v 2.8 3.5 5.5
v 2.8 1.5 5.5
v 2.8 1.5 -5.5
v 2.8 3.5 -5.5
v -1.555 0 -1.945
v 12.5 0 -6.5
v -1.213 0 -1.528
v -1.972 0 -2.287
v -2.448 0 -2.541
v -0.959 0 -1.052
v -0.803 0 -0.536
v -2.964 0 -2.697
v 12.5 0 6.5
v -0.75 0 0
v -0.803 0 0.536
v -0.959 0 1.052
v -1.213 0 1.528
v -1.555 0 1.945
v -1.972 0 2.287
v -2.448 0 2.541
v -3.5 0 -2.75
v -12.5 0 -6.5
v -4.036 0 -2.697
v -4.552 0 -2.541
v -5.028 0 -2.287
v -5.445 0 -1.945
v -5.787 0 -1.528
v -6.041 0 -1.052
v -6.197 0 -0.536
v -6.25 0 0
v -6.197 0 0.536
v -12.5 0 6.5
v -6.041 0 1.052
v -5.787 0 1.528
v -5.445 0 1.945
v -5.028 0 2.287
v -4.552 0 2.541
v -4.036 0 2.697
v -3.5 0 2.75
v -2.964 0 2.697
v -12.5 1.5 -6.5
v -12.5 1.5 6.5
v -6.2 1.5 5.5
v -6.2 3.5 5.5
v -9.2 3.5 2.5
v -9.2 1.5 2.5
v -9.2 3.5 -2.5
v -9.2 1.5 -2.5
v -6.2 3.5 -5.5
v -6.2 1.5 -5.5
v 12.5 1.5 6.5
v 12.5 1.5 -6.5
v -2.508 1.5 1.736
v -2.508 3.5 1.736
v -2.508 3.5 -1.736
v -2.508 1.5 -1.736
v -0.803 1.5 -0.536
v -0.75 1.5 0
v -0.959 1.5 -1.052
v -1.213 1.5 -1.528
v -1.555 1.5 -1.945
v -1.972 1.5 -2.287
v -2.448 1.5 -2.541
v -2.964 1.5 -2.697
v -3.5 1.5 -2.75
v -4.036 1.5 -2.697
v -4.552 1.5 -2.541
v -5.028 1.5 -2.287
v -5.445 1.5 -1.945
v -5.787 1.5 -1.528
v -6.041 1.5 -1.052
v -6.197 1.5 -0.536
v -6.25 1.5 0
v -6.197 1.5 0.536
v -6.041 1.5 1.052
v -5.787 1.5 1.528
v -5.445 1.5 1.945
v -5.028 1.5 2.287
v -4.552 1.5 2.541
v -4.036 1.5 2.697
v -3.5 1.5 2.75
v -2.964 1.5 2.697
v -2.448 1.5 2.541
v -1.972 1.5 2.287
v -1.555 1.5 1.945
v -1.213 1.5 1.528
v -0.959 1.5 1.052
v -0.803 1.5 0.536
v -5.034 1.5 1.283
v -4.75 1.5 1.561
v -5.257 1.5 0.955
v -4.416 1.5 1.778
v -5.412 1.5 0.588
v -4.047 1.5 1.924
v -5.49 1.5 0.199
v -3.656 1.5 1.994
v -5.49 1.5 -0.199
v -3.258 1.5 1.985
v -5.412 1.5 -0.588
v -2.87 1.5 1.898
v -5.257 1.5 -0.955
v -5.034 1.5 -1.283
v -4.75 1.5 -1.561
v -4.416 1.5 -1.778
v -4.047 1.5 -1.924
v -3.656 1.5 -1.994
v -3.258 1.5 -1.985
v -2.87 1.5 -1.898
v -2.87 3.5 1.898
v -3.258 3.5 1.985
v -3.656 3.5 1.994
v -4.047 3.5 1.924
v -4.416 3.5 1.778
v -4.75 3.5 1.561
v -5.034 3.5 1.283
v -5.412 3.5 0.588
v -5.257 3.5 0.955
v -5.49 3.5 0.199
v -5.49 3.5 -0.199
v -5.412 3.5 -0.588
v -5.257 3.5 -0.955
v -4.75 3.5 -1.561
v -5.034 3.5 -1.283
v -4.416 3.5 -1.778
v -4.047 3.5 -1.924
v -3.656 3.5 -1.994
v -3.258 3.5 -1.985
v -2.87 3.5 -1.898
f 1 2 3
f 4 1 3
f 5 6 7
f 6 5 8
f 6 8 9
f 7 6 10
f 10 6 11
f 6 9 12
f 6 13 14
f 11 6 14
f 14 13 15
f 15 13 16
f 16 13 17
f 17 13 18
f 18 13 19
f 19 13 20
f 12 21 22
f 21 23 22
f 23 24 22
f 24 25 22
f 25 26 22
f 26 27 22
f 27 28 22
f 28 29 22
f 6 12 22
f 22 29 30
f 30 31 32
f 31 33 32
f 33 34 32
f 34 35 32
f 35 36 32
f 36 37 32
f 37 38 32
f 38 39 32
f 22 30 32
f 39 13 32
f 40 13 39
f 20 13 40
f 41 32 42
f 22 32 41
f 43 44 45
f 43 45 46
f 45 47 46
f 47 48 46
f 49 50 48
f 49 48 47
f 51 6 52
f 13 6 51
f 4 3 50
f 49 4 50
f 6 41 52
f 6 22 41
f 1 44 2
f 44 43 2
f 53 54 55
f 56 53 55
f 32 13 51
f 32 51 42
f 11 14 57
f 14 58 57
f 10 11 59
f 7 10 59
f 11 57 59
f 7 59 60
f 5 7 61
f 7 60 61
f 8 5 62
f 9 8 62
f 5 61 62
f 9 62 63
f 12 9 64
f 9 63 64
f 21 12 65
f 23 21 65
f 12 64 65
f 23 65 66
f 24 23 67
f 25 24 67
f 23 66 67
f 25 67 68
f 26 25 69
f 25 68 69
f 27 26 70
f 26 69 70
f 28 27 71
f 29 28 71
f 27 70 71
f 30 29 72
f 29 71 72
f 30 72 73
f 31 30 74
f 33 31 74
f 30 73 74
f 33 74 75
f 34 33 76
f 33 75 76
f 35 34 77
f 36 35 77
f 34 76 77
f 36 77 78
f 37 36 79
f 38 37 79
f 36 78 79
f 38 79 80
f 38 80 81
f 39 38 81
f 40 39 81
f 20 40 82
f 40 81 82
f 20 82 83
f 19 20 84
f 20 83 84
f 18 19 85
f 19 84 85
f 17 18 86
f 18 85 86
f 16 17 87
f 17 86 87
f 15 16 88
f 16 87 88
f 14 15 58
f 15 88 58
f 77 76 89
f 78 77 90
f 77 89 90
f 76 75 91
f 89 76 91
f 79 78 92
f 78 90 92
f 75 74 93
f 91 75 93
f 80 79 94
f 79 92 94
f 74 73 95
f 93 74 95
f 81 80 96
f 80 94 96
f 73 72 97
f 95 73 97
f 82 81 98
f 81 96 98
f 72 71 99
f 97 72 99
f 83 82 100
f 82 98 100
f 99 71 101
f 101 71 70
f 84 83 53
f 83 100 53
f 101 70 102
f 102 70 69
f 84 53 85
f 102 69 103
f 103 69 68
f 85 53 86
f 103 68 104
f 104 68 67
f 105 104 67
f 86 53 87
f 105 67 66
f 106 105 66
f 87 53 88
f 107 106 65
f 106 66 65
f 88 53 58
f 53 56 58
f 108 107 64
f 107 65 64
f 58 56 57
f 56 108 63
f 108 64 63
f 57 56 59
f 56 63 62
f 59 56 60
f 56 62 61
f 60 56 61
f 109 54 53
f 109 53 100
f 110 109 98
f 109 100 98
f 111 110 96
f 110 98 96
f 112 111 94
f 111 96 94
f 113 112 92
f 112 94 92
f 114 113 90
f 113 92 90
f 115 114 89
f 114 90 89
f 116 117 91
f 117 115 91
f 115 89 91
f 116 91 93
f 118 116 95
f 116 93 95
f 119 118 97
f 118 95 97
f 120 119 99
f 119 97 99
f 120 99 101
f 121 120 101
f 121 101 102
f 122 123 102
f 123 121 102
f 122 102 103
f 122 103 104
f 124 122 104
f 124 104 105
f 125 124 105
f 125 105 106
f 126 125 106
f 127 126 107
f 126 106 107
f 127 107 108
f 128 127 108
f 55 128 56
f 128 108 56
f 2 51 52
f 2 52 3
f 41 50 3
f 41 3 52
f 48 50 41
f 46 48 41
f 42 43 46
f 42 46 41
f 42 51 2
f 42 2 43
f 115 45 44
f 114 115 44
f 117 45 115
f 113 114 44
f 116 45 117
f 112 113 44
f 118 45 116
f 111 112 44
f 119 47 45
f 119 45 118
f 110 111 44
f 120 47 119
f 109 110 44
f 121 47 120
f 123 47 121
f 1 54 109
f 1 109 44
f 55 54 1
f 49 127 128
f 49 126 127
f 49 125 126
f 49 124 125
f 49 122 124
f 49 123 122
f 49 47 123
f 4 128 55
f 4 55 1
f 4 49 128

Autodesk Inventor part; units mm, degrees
ref_plane "YZ Plane" through (0, 0, 0) normal (1, 0, 0) x (0, 1, 0)
ref_plane "XZ Plane" through (0, 0, 0) normal (0, 1, 0) x (-1, 0, 0)
ref_plane "XY Plane" through (0, 0, 0) normal (0, 0, 1) x (1, 0, 0)
sketch "Boceto1" plane through (0, 0, 0) normal (0, 1, 0) x (-1, 0, 0)
  line L0 (-12.5, 6.5) -> (12.5, 6.5)
  line L1 (12.5, 6.5) -> (12.5, -6.5)
  line L2 (12.5, -6.5) -> (-12.5, -6.5)
  line L3 (-12.5, -6.5) -> (-12.5, 6.5)
  line L4 (-12.5, 6.5) -> (12.5, -6.5) construction
  line L5 (12.5, 6.5) -> (-12.5, -6.5) construction
  point P0 (0, 0)
  dimension "d0" = 13
  dimension "d1" = 25
extrude "Extrusión1" add sketch "Boceto1" along normal blind 1.5
sketch "Boceto2" plane through (0, 1.5, 0) normal (0, 1, 0) x (1, 0, 0)
  circle A0 centre (-3.5, 0) radius 2.75
  line L0 (-12.5, 6.5) -> (-12.5, -6.5) projected
  point P0 (0, 0)
  dimension "d4" = 9
  dimension "d5" = 5.5
extrude "Extrusión2" cut sketch "Boceto2" against normal blind 1.5
sketch "Boceto3" plane through (0, 1.5, 0) normal (0, 1, 0) x (1, 0, 0)
  line L0 (-9.2, -5.5) -> (2.8, -5.5)
  line L1 (2.8, -5.5) -> (2.8, 5.5)
  line L2 (2.8, 5.5) -> (-9.2, 5.5)
  line L3 (-9.2, 5.5) -> (-9.2, -5.5)
  line L4 (-12.5, 6.5) -> (-12.5, -6.5) projected
  line L5 (12.5, 6.5) -> (-12.5, 6.5) projected
  circle A0 centre (-3.5, 0) radius 2.75 projected
  circle A1 centre (-3.5, 0) radius 2
  point P0 (0, 0)
  dimension "d8" = 11
  dimension "d9" = 12
  dimension "d10" = 3.3
  dimension "d11" = 1
  dimension "d14" = 4
extrude "Extrusión3" add sketch "Boceto3" along normal blind 2 contours L3 L2 L1 L0 | A0
chamfer "Chaflán1" distance 3 angle 45 2 edges at (-9.2, 2.5, 5.5) (-9.2, 2.5, -5.5)
sketch "Boceto4" plane through (0, 3.5, 0) normal (0, 1, 0) x (1, 0, 0)
  circle A0 centre (-3.5, 0) radius 2 projected
  line L0 (-2.5075, -1.7363) -> (-2.5075, 1.7363)
  point P0 (0, 0)
extrude "Extrusión4" add sketch "Boceto4" against normal up to surface (2 mm away) contours A0 L0 picked at (-2.1717, 0)
properties part number "AngleSensor"
